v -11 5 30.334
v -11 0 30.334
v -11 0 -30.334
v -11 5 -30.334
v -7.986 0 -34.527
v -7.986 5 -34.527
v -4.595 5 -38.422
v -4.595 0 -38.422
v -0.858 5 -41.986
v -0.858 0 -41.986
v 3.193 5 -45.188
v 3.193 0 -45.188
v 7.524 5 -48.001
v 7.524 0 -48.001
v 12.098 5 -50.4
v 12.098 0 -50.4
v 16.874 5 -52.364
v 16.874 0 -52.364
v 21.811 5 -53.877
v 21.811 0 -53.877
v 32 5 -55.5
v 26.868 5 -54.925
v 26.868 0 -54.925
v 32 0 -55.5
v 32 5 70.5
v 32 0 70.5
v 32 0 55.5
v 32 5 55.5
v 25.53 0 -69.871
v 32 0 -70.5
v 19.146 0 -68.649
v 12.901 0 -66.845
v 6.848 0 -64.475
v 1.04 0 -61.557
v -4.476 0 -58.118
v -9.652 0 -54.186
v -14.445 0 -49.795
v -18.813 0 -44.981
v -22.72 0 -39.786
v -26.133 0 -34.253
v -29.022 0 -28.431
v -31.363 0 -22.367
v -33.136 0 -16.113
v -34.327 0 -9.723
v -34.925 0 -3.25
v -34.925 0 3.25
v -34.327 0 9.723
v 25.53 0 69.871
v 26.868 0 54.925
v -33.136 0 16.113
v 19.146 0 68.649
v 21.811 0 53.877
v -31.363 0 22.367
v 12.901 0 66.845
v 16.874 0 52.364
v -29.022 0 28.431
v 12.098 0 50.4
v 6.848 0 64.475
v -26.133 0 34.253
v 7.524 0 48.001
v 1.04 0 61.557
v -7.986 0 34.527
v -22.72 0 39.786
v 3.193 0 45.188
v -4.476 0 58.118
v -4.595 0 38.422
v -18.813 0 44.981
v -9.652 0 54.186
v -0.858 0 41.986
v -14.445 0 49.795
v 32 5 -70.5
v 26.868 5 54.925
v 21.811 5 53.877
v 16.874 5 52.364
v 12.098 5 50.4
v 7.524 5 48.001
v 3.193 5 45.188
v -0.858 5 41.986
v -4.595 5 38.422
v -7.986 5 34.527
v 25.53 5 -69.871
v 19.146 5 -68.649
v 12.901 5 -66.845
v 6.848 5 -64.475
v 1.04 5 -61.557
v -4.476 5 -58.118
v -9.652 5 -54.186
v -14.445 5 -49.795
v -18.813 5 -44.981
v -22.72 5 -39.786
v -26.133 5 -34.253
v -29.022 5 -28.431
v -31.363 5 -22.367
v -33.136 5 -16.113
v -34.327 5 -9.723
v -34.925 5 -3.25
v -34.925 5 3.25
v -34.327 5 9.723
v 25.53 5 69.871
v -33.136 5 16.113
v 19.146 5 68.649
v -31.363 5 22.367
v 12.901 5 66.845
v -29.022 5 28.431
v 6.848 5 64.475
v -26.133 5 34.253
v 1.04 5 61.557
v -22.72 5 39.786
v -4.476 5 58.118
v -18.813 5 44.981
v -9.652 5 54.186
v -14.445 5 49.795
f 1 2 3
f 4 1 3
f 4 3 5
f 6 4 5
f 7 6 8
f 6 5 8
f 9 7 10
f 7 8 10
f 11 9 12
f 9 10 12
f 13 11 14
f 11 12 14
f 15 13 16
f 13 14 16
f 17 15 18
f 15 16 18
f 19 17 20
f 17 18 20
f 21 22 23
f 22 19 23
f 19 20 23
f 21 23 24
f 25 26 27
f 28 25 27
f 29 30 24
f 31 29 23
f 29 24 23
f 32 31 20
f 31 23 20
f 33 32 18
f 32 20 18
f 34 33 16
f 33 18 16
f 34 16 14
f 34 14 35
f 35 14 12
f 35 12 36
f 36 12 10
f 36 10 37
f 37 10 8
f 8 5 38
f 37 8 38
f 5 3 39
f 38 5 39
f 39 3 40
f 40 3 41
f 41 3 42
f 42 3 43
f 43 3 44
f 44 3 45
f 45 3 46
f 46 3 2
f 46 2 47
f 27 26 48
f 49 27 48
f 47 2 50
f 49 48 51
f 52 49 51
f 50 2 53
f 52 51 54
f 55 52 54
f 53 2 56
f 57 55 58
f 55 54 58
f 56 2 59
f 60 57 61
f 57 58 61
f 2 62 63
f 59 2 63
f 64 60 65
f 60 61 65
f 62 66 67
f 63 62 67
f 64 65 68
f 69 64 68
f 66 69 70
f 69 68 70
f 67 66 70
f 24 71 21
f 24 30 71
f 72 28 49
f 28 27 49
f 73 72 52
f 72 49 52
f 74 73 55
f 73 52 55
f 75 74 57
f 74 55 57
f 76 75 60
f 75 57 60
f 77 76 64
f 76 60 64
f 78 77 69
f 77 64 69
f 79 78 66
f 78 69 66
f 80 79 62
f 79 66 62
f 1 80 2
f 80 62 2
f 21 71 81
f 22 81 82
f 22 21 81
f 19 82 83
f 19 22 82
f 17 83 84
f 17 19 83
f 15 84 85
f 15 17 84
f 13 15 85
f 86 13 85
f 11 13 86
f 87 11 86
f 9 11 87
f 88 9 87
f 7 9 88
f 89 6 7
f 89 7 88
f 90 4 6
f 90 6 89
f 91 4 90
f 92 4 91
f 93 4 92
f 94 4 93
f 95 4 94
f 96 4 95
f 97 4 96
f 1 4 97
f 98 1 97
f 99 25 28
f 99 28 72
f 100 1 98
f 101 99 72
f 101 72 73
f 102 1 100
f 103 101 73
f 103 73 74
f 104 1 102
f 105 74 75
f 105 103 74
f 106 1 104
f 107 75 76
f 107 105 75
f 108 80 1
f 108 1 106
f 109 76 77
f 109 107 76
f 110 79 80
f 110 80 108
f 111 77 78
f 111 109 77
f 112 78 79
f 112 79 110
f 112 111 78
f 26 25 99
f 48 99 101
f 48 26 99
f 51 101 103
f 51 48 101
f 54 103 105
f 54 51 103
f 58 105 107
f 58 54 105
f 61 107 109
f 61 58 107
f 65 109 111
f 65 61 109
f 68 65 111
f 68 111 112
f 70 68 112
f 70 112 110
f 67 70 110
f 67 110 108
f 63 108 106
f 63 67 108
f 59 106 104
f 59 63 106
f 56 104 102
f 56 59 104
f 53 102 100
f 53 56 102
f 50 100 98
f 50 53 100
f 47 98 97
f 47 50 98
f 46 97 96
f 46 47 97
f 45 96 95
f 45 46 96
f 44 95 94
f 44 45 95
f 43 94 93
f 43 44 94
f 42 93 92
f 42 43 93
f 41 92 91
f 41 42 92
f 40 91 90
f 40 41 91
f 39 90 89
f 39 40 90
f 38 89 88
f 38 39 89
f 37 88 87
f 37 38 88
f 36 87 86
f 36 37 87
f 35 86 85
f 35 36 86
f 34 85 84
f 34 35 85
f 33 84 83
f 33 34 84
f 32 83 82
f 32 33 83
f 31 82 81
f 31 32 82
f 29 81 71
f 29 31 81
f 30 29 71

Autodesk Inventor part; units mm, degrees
ref_plane "YZ Plane" through (0, 0, 0) normal (1, 0, 0) x (0, 1, 0)
ref_plane "XZ Plane" through (0, 0, 0) normal (0, 1, 0) x (-1, 0, 0)
ref_plane "XY Plane" through (0, 0, 0) normal (0, 0, 1) x (1, 0, 0)
sketch "Sketch1" plane through (0, 0, 0) normal (0, 1, 0) x (-1, 0, 0)
  line L0 (-32, 70.5) -> (-32, 55.5)
  line L1 (-32, -70.5) -> (-32, -55.5)
  arc A0 (11, 30.3335) -> (-32, 55.5) centre (-35.6178, 0) ccw
  arc A1 (-32, -55.5) -> (11, -30.3335) centre (-35.6178, 0) ccw
  line L2 (11, 30.3335) -> (11, -30.3335)
  arc A2 (-32, -70.5) -> (-32, 70.5) centre (-35.5914, 0) ccw
  line L3 (35, 0) -> (11, 0)
  point P0 (0, 0)
  dimension "d1" = 141
  dimension "d2" = 15
  dimension "d3" = 15
  dimension "d7" = 24
extrude "Extrusion1" add sketch "Sketch1" along normal blind 5
properties part number "zablona_oblouk"
